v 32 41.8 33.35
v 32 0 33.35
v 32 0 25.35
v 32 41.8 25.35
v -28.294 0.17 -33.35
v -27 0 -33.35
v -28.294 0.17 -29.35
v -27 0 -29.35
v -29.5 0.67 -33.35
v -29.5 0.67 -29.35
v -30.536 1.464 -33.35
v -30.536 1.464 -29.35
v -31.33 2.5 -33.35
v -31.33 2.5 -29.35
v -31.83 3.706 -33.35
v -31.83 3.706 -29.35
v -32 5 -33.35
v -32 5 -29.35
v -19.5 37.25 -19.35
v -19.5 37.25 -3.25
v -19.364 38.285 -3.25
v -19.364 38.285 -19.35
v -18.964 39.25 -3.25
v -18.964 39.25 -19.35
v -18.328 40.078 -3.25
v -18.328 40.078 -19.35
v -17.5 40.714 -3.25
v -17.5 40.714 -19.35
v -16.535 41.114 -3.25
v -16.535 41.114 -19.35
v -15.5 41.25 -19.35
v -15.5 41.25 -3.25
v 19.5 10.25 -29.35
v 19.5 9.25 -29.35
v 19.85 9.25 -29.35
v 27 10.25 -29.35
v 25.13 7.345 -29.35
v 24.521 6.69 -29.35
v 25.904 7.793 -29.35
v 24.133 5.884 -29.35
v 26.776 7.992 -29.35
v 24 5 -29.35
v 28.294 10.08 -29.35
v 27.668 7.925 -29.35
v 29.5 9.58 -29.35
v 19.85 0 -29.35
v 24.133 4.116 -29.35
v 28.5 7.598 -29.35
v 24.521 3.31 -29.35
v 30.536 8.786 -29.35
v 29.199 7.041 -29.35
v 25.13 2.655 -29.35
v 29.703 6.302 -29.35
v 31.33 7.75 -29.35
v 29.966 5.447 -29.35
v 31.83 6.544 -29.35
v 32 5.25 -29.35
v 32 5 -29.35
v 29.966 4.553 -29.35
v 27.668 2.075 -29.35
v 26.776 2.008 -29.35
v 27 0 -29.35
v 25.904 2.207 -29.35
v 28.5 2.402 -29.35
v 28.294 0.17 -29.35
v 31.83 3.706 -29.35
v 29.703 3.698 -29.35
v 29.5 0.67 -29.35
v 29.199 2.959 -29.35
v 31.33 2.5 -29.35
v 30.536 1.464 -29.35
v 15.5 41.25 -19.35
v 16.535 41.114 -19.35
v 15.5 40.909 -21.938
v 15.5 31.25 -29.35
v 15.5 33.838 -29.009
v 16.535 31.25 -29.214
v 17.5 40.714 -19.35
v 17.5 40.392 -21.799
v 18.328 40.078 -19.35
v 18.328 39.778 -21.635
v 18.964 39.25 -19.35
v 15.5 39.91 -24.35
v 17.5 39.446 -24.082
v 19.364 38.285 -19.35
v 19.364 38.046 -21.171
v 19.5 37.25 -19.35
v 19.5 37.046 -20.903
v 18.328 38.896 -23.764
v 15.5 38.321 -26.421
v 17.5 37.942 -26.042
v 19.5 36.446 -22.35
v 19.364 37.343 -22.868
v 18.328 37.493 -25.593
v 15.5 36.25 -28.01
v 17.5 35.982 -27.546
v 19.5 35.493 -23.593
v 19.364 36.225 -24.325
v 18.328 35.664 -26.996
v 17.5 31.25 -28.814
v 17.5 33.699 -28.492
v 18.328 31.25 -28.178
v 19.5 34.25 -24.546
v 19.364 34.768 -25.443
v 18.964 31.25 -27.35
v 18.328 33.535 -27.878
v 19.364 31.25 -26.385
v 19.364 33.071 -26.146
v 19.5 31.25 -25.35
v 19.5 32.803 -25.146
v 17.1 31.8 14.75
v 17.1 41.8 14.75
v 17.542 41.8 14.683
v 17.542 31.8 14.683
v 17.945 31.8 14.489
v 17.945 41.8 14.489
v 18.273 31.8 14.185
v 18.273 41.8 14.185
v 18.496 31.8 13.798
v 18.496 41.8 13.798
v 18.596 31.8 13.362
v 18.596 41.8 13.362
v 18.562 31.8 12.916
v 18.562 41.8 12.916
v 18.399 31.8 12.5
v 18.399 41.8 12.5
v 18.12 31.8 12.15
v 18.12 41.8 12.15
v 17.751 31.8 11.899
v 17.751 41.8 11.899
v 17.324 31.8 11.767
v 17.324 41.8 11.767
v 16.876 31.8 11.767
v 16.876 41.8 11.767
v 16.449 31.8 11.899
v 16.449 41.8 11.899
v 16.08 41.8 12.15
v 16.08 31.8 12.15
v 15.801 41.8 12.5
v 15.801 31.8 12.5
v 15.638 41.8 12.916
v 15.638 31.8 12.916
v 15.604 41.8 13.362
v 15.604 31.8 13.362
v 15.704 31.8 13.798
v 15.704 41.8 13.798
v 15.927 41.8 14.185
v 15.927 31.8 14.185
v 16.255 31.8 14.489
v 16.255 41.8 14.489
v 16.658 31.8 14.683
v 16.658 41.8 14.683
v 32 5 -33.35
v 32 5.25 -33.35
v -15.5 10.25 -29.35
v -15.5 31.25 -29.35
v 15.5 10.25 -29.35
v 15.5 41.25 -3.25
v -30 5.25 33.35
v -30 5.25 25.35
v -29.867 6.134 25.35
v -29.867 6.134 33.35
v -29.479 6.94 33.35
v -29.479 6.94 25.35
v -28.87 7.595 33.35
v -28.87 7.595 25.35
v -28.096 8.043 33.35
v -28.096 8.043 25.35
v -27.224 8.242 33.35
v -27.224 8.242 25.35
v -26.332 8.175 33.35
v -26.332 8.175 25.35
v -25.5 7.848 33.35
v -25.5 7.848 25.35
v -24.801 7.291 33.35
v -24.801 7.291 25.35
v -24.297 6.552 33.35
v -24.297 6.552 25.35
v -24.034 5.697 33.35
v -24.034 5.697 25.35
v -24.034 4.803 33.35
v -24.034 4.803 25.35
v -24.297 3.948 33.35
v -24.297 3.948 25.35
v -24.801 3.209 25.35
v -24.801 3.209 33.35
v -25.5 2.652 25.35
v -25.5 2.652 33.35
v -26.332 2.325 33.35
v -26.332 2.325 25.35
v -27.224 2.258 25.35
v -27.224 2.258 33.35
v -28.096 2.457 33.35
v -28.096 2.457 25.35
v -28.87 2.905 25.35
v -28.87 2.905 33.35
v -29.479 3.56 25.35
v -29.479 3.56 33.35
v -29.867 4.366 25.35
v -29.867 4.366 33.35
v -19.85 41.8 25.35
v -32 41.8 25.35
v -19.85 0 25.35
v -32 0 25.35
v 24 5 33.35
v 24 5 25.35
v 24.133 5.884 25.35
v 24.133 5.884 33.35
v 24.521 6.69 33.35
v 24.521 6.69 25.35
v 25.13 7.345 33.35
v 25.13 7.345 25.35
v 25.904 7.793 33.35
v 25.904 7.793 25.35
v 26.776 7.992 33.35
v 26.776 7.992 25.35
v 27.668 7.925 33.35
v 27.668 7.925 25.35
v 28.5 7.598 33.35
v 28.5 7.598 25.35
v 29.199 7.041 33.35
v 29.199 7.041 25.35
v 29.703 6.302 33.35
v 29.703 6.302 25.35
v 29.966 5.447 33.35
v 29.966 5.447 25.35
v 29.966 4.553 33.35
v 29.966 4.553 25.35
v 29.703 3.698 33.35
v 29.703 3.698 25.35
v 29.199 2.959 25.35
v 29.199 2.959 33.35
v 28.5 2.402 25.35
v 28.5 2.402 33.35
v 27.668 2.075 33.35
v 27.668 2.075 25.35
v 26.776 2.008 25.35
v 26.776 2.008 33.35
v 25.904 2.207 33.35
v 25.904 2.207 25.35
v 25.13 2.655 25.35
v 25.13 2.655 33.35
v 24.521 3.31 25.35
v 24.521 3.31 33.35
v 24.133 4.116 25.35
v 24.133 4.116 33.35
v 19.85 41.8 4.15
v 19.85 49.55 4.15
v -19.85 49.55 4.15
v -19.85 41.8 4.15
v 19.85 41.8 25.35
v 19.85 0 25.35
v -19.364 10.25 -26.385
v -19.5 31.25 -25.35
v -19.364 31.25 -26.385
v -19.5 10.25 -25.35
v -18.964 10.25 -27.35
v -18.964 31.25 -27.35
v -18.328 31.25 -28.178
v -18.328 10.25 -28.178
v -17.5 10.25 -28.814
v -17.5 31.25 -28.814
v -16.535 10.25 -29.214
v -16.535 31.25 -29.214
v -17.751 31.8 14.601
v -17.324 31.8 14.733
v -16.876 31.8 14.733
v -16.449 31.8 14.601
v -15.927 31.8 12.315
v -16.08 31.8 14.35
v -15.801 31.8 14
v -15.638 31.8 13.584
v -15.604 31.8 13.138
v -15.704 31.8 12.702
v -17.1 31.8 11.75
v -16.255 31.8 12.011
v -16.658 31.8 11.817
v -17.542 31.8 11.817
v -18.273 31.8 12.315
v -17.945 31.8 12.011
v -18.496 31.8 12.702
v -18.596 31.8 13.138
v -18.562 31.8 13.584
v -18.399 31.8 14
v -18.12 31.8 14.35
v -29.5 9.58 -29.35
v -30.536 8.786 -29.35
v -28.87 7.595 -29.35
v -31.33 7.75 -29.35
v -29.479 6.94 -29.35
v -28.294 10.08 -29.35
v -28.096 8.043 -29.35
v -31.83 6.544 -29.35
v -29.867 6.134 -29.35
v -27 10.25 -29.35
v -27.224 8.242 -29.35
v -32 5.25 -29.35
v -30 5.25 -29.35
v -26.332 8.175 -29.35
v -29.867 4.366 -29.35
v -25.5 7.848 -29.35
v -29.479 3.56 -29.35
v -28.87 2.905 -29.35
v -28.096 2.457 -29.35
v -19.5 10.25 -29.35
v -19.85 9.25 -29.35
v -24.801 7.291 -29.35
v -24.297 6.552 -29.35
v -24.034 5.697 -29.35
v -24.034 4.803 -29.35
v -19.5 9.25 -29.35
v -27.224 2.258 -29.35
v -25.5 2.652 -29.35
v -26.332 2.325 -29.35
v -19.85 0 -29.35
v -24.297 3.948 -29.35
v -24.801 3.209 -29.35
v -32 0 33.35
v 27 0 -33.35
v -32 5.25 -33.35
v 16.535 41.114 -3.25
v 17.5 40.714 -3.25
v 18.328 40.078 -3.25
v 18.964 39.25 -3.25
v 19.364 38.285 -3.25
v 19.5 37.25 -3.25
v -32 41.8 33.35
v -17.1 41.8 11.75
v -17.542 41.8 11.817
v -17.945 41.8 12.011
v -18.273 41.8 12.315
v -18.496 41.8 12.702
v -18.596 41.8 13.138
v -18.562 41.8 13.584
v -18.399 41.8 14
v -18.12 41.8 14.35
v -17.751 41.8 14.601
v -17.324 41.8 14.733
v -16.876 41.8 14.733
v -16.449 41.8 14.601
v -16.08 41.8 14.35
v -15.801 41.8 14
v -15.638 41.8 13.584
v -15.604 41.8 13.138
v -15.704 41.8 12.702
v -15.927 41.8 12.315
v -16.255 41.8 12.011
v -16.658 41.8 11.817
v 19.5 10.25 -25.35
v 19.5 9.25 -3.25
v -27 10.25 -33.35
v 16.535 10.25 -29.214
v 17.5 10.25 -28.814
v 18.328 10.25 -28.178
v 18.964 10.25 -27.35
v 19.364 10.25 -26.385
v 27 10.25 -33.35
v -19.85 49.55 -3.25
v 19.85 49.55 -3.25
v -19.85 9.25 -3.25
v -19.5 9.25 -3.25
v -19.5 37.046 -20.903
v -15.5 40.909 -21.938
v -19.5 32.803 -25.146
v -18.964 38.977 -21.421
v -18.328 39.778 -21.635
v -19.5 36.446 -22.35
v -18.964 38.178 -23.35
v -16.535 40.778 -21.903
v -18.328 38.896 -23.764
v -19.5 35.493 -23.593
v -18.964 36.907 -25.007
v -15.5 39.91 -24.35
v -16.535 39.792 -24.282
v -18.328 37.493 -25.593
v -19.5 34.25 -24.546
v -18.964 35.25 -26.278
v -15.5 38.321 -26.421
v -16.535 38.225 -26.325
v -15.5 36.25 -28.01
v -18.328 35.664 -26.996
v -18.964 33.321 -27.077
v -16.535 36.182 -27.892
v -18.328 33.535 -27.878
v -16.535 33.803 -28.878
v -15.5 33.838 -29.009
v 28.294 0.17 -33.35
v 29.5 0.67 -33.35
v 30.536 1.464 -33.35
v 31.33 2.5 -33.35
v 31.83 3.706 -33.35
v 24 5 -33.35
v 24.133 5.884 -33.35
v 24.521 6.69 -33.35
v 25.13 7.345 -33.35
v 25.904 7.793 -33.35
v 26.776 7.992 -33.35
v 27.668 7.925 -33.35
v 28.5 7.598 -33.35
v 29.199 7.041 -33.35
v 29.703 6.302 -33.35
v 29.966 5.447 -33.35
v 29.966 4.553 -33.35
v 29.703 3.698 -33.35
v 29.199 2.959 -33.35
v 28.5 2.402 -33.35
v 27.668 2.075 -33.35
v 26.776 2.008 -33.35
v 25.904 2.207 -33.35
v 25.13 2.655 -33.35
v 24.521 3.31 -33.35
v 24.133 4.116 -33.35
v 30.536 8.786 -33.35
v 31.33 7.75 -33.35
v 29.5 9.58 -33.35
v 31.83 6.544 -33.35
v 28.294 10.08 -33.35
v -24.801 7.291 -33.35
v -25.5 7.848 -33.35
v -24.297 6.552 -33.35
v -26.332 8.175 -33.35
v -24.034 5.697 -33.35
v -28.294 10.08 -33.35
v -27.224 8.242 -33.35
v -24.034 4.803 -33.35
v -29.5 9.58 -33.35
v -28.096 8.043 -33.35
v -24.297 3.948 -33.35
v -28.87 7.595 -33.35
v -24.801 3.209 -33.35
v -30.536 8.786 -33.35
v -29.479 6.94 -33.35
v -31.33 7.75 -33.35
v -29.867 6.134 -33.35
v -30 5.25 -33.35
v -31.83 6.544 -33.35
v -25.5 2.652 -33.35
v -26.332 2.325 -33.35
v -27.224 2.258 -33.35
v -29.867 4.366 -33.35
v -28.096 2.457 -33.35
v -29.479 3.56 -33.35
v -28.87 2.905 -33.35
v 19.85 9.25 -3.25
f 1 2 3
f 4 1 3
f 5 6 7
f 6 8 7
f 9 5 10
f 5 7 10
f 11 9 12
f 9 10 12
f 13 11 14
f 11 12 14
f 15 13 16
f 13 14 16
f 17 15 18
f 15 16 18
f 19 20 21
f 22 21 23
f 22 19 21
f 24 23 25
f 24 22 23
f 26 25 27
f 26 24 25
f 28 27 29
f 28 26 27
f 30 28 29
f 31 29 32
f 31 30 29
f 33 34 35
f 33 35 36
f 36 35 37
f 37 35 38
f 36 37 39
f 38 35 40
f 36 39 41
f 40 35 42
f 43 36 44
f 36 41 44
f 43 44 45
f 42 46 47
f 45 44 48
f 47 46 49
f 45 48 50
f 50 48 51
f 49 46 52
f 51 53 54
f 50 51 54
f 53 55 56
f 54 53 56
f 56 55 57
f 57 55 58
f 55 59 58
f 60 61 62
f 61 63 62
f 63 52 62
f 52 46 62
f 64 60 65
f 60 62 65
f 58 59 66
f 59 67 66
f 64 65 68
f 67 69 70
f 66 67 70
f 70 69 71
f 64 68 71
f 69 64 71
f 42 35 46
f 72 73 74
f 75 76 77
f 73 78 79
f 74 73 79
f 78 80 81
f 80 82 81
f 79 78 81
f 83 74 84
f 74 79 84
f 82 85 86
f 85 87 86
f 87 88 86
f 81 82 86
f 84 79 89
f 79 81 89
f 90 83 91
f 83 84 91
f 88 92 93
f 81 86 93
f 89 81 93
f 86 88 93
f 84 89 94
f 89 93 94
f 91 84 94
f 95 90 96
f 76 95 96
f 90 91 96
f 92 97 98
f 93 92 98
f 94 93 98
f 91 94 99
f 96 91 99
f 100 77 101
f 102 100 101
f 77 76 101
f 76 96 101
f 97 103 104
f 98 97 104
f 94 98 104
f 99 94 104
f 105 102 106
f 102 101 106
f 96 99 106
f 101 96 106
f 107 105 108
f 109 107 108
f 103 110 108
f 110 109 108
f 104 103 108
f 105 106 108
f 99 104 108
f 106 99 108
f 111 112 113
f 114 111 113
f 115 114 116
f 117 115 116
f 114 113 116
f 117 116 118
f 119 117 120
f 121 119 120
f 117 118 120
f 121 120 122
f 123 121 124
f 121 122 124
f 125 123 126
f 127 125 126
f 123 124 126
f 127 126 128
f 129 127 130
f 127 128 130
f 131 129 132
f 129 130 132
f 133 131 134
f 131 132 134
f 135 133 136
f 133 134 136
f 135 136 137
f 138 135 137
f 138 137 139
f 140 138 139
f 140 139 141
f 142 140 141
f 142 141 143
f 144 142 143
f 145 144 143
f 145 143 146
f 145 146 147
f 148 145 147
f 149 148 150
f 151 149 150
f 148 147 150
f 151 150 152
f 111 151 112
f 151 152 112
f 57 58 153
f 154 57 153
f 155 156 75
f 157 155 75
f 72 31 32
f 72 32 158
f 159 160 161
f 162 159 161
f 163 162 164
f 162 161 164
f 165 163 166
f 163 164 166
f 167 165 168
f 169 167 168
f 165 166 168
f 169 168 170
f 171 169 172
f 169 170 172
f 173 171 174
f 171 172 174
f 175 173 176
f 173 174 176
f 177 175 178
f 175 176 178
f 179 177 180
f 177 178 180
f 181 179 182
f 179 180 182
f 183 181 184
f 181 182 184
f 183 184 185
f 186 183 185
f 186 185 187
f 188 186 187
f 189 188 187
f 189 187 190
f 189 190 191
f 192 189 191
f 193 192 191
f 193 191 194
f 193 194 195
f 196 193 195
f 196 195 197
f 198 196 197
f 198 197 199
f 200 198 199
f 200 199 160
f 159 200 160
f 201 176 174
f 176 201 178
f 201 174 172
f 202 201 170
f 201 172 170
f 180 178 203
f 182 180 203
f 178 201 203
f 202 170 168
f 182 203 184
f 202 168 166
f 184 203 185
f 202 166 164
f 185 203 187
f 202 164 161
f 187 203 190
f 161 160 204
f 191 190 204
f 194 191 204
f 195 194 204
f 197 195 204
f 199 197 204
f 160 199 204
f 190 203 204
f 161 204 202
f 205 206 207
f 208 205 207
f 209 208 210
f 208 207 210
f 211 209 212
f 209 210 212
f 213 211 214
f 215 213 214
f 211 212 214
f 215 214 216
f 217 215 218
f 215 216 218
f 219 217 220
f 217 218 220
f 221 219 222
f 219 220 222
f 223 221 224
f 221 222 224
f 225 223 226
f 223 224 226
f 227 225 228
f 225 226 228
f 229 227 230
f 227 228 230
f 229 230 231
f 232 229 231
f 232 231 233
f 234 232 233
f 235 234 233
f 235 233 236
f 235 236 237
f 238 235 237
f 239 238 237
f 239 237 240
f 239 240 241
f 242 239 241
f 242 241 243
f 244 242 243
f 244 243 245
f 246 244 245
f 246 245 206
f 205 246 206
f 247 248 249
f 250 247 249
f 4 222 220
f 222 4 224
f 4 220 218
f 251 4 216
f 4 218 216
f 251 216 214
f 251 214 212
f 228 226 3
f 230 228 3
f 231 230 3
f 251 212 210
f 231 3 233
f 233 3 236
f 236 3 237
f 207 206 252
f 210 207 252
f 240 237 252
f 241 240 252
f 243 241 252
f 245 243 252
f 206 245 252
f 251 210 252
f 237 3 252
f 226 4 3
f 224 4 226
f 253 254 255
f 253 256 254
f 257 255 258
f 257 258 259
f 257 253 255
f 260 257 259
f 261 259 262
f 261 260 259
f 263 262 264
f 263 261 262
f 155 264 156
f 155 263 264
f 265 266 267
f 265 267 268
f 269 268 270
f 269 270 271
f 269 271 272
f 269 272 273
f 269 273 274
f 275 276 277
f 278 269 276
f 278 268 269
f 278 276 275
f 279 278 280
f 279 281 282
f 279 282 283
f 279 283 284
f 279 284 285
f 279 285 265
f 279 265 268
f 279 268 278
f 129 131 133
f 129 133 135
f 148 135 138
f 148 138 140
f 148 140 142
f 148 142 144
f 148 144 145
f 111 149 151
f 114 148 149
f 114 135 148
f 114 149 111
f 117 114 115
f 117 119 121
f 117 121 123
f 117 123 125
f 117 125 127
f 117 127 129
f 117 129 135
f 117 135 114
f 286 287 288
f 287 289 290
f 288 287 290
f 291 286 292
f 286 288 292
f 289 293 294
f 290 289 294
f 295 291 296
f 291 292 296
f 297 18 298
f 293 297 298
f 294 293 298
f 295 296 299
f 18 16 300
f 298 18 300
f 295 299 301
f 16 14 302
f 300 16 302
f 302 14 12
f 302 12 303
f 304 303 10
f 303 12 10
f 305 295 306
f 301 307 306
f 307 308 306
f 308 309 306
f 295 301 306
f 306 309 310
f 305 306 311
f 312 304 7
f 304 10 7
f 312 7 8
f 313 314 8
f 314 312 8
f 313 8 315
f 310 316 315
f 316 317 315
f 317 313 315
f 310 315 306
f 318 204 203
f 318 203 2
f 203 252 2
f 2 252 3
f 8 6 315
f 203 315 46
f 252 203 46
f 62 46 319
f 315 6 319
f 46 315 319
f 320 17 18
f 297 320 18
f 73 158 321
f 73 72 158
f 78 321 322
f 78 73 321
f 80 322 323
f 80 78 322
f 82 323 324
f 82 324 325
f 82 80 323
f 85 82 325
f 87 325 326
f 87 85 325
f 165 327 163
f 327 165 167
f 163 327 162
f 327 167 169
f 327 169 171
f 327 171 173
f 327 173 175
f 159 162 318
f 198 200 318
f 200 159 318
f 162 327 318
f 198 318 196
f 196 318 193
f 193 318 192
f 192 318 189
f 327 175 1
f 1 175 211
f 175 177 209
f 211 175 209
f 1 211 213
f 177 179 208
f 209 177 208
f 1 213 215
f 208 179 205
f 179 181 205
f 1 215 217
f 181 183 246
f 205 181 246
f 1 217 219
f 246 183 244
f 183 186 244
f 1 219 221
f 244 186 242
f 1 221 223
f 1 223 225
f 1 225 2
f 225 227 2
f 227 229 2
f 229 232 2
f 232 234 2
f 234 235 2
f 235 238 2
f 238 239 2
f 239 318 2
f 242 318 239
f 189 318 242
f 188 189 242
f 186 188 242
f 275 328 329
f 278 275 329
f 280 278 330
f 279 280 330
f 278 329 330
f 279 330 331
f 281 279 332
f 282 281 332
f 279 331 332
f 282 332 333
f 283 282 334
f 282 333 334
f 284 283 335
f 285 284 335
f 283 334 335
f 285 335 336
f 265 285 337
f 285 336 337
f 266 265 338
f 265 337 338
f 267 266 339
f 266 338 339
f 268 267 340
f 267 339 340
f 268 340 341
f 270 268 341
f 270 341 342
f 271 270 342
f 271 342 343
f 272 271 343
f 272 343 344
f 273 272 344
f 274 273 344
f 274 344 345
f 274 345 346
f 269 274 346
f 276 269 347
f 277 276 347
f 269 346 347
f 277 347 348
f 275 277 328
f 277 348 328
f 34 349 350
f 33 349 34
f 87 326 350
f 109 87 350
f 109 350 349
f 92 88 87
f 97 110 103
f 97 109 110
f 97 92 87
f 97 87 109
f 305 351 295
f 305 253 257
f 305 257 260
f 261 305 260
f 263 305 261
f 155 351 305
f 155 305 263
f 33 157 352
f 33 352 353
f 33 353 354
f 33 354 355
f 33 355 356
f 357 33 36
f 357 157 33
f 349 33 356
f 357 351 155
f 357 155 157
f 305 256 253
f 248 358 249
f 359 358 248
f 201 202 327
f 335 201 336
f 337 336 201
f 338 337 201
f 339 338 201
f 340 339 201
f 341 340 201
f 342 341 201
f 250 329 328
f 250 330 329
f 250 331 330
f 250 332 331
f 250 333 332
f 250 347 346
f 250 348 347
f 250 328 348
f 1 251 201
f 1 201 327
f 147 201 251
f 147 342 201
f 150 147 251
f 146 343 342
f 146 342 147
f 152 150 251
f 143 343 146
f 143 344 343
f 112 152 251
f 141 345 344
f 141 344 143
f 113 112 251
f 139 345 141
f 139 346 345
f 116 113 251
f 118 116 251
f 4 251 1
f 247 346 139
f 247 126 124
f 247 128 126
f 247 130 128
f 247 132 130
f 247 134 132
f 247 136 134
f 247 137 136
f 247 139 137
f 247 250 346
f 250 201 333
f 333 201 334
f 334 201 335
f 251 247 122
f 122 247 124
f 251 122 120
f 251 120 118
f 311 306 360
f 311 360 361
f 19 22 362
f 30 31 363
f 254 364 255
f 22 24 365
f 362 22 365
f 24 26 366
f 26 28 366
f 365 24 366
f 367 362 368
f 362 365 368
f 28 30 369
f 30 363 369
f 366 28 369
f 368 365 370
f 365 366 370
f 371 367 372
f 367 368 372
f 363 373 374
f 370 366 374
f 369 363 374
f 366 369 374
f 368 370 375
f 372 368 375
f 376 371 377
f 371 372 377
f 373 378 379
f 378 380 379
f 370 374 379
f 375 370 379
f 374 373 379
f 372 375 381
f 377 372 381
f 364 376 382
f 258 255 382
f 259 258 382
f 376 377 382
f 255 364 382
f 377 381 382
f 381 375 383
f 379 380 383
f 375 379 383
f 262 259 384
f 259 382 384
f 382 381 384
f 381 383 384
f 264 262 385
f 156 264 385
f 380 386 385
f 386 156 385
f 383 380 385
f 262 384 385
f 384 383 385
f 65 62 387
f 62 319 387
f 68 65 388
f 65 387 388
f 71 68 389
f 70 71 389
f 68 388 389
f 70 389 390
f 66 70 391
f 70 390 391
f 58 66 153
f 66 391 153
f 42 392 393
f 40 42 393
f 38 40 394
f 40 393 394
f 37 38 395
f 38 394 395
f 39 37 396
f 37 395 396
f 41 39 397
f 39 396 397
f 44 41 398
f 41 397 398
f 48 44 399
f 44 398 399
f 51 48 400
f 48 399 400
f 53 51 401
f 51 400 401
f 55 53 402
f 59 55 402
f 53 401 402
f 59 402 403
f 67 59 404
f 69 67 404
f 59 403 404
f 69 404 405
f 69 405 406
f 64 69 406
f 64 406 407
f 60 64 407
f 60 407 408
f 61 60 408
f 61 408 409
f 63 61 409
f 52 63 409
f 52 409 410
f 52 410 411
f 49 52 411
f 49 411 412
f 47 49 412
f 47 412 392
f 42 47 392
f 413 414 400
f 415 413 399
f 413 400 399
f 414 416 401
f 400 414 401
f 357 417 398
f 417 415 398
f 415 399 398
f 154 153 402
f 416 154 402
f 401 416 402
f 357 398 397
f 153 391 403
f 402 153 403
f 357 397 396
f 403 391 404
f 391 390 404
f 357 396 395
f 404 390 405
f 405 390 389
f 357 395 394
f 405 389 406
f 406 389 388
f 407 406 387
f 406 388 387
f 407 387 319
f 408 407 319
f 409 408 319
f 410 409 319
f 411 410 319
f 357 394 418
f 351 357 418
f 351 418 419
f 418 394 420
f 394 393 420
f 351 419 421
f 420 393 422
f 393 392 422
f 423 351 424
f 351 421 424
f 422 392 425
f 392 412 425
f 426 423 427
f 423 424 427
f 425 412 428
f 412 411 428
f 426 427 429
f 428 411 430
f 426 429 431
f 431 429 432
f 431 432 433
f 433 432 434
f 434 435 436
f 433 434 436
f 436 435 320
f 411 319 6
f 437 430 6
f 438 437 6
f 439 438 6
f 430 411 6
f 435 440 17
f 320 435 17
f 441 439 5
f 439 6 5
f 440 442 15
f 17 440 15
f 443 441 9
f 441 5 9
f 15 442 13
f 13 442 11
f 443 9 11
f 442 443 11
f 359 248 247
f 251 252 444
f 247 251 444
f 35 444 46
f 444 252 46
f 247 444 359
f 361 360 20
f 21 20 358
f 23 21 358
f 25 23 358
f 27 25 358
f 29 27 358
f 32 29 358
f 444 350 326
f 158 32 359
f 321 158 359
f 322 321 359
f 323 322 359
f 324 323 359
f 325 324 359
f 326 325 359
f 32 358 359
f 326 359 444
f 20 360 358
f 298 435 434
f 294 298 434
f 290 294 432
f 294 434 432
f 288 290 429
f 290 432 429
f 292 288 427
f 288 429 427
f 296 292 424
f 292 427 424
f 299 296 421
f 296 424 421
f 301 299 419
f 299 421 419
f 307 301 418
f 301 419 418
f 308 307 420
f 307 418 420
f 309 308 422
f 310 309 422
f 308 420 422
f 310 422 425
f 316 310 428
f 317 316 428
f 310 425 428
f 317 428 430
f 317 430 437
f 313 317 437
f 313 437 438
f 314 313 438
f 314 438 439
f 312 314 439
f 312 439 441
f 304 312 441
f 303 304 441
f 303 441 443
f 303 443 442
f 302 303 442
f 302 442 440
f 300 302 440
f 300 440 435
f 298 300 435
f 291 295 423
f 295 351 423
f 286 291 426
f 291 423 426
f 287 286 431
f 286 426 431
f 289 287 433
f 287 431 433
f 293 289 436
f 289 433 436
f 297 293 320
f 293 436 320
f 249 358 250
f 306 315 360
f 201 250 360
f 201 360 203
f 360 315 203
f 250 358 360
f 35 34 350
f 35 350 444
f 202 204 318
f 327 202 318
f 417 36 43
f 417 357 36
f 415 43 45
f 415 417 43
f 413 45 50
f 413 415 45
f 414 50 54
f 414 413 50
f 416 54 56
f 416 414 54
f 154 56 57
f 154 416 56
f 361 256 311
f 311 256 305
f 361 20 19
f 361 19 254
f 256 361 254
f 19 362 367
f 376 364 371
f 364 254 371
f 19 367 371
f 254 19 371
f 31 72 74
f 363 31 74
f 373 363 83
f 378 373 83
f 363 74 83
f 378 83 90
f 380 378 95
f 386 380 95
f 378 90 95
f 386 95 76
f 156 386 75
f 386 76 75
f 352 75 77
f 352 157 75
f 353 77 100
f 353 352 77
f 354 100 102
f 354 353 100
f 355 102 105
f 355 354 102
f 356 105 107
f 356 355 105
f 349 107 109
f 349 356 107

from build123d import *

# Parameters (mm, degrees)
RESSALTO_EXTRUS_O1_DEPTH = 49.55
ESBO_O2_W                = 39
ESBO_O2_H                = 26.1
CORTE_EXTRUS_O1_DEPTH    = 8.3
ESBO_O2_3_W              = 0.35
ESBO_O2_3_H              = 26.1
CORTE_EXTRUS_O2_DEPTH    = 40.3
ESBO_O3_W                = 64
ESBO_O3_H                = 4
CORTE_EXTRUS_O3_DEPTH    = 39.3
FILETE2_R                = 5
FILETE3_R                = 10
ESBO_O4_R                = 3
CORTE_EXTRUS_O4_DEPTH    = 90.03983659
CORTE_EXTRUS_O5_DEPTH    = 7.75
ESBO_O6_R                = 1.5
CORTE_EXTRUS_O6_DEPTH    = 10
FILETE4_R                = 4


with BuildPart() as part:
    # Esboço1 → Ressalto-extrusão1 (new body)
    with BuildSketch(Plane(origin=(0, 0, 0), x_dir=(1, 0, 0), z_dir=(0, 1, 0))):
        Polygon((-32, 33.35), (-32, 29.35), (-19.85, 29.35), (-19.85, -25.35), (-32, -25.35), (-32, -33.35), (32, -33.35), (32, -25.35), (19.85, -25.35), (19.85, 29.35), (32, 29.35), (32, 33.35), align=None)
    extrude(amount=RESSALTO_EXTRUS_O1_DEPTH)

    # Esboço2 → Corte-extrusão1 (cut)
    with BuildSketch(Plane(origin=(0, 49.55, 0), x_dir=(1, 0, 0), z_dir=(0, 1, 0))):
        with Locations((0, 16.3)):
            Rectangle(ESBO_O2_W, ESBO_O2_H)
    extrude(amount=-CORTE_EXTRUS_O1_DEPTH, mode=Mode.SUBTRACT)

    # Esboço2<3> → Corte-extrusão2 (cut)
    with BuildSketch(Plane(origin=(0, 49.55, 0), x_dir=(1, 0, 0), z_dir=(0, 1, 0))):
        with Locations((19.675, 16.3)):
            Rectangle(ESBO_O2_3_W, ESBO_O2_3_H)
        with Locations((-19.675, 16.3)):
            Rectangle(ESBO_O2_3_W, ESBO_O2_3_H)
    extrude(amount=-CORTE_EXTRUS_O2_DEPTH, mode=Mode.SUBTRACT)

    # Esboço3 → Corte-extrusão3 (cut)
    with BuildSketch(Plane(origin=(0, 49.55, 0), x_dir=(1, 0, 0), z_dir=(0, 1, 0))):
        with Locations((0, 31.35)):
            Rectangle(ESBO_O3_W, ESBO_O3_H)
    extrude(amount=-CORTE_EXTRUS_O3_DEPTH, mode=Mode.SUBTRACT)

    # Filete2
    filete2_edges = [part.edges().sort_by_distance(p)[0] for p in [
        (-32, 0, -31.35),
        (-32, 10.25, -31.35),
        (32, 0, -31.35),
        (32, 10.25, -31.35),
    ]]
    fillet(filete2_edges, radius=FILETE2_R)

    # Filete3
    filete3_edges = [part.edges().sort_by_distance(p)[0] for p in [
        (0, 41.25, -29.35),
    ]]
    fillet(filete3_edges, radius=FILETE3_R)

    # Esboço4 → Corte-extrusão4 (cut, through all)
    with BuildSketch(Plane(origin=(0, 0, -33.35), x_dir=(-1, 0, 0), z_dir=(0, 0, -1))):
        with Locations((27, 5.25)):
            Circle(ESBO_O4_R)
        with Locations((-27, 5)):
            Circle(ESBO_O4_R)
    extrude(amount=-CORTE_EXTRUS_O4_DEPTH, mode=Mode.SUBTRACT)

    # Esboço5 → Corte-extrusão5 (cut)
    with BuildSketch(Plane(origin=(0, 49.55, 0), x_dir=(1, 0, 0), z_dir=(0, 1, 0))):
        Polygon((-19.85, -4.15), (-19.85, -25.35), (-32, -25.35), (-32, -33.35), (32, -33.35), (32, -25.35), (19.85, -25.35), (19.85, -4.15), align=None)
    extrude(amount=-CORTE_EXTRUS_O5_DEPTH, mode=Mode.SUBTRACT)

    # Esboço6 → Corte-extrusão6 (cut)
    with BuildSketch(Plane(origin=(0, 41.8, 0), x_dir=(1, 0, 0), z_dir=(0, 1, 0))):
        with Locations((17.1, -13.25)):
            Circle(ESBO_O6_R)
        with Locations((-17.1, -13.25)):
            Circle(ESBO_O6_R)
    extrude(amount=-CORTE_EXTRUS_O6_DEPTH, mode=Mode.SUBTRACT)

    # Filete4
    filete4_edges = [part.edges().sort_by_distance(p)[0] for p in [
        (-19.5, 20.75, -29.35),
        (-19.5, 38.321067812, -26.421067812),
        (19.5, 20.75, -29.35),
        (19.5, 38.321067812, -26.421067812),
        (-19.5, 41.25, -11.3),
        (19.5, 41.25, -11.3),
    ]]
    fillet(filete4_edges, radius=FILETE4_R)


solid = part.part
